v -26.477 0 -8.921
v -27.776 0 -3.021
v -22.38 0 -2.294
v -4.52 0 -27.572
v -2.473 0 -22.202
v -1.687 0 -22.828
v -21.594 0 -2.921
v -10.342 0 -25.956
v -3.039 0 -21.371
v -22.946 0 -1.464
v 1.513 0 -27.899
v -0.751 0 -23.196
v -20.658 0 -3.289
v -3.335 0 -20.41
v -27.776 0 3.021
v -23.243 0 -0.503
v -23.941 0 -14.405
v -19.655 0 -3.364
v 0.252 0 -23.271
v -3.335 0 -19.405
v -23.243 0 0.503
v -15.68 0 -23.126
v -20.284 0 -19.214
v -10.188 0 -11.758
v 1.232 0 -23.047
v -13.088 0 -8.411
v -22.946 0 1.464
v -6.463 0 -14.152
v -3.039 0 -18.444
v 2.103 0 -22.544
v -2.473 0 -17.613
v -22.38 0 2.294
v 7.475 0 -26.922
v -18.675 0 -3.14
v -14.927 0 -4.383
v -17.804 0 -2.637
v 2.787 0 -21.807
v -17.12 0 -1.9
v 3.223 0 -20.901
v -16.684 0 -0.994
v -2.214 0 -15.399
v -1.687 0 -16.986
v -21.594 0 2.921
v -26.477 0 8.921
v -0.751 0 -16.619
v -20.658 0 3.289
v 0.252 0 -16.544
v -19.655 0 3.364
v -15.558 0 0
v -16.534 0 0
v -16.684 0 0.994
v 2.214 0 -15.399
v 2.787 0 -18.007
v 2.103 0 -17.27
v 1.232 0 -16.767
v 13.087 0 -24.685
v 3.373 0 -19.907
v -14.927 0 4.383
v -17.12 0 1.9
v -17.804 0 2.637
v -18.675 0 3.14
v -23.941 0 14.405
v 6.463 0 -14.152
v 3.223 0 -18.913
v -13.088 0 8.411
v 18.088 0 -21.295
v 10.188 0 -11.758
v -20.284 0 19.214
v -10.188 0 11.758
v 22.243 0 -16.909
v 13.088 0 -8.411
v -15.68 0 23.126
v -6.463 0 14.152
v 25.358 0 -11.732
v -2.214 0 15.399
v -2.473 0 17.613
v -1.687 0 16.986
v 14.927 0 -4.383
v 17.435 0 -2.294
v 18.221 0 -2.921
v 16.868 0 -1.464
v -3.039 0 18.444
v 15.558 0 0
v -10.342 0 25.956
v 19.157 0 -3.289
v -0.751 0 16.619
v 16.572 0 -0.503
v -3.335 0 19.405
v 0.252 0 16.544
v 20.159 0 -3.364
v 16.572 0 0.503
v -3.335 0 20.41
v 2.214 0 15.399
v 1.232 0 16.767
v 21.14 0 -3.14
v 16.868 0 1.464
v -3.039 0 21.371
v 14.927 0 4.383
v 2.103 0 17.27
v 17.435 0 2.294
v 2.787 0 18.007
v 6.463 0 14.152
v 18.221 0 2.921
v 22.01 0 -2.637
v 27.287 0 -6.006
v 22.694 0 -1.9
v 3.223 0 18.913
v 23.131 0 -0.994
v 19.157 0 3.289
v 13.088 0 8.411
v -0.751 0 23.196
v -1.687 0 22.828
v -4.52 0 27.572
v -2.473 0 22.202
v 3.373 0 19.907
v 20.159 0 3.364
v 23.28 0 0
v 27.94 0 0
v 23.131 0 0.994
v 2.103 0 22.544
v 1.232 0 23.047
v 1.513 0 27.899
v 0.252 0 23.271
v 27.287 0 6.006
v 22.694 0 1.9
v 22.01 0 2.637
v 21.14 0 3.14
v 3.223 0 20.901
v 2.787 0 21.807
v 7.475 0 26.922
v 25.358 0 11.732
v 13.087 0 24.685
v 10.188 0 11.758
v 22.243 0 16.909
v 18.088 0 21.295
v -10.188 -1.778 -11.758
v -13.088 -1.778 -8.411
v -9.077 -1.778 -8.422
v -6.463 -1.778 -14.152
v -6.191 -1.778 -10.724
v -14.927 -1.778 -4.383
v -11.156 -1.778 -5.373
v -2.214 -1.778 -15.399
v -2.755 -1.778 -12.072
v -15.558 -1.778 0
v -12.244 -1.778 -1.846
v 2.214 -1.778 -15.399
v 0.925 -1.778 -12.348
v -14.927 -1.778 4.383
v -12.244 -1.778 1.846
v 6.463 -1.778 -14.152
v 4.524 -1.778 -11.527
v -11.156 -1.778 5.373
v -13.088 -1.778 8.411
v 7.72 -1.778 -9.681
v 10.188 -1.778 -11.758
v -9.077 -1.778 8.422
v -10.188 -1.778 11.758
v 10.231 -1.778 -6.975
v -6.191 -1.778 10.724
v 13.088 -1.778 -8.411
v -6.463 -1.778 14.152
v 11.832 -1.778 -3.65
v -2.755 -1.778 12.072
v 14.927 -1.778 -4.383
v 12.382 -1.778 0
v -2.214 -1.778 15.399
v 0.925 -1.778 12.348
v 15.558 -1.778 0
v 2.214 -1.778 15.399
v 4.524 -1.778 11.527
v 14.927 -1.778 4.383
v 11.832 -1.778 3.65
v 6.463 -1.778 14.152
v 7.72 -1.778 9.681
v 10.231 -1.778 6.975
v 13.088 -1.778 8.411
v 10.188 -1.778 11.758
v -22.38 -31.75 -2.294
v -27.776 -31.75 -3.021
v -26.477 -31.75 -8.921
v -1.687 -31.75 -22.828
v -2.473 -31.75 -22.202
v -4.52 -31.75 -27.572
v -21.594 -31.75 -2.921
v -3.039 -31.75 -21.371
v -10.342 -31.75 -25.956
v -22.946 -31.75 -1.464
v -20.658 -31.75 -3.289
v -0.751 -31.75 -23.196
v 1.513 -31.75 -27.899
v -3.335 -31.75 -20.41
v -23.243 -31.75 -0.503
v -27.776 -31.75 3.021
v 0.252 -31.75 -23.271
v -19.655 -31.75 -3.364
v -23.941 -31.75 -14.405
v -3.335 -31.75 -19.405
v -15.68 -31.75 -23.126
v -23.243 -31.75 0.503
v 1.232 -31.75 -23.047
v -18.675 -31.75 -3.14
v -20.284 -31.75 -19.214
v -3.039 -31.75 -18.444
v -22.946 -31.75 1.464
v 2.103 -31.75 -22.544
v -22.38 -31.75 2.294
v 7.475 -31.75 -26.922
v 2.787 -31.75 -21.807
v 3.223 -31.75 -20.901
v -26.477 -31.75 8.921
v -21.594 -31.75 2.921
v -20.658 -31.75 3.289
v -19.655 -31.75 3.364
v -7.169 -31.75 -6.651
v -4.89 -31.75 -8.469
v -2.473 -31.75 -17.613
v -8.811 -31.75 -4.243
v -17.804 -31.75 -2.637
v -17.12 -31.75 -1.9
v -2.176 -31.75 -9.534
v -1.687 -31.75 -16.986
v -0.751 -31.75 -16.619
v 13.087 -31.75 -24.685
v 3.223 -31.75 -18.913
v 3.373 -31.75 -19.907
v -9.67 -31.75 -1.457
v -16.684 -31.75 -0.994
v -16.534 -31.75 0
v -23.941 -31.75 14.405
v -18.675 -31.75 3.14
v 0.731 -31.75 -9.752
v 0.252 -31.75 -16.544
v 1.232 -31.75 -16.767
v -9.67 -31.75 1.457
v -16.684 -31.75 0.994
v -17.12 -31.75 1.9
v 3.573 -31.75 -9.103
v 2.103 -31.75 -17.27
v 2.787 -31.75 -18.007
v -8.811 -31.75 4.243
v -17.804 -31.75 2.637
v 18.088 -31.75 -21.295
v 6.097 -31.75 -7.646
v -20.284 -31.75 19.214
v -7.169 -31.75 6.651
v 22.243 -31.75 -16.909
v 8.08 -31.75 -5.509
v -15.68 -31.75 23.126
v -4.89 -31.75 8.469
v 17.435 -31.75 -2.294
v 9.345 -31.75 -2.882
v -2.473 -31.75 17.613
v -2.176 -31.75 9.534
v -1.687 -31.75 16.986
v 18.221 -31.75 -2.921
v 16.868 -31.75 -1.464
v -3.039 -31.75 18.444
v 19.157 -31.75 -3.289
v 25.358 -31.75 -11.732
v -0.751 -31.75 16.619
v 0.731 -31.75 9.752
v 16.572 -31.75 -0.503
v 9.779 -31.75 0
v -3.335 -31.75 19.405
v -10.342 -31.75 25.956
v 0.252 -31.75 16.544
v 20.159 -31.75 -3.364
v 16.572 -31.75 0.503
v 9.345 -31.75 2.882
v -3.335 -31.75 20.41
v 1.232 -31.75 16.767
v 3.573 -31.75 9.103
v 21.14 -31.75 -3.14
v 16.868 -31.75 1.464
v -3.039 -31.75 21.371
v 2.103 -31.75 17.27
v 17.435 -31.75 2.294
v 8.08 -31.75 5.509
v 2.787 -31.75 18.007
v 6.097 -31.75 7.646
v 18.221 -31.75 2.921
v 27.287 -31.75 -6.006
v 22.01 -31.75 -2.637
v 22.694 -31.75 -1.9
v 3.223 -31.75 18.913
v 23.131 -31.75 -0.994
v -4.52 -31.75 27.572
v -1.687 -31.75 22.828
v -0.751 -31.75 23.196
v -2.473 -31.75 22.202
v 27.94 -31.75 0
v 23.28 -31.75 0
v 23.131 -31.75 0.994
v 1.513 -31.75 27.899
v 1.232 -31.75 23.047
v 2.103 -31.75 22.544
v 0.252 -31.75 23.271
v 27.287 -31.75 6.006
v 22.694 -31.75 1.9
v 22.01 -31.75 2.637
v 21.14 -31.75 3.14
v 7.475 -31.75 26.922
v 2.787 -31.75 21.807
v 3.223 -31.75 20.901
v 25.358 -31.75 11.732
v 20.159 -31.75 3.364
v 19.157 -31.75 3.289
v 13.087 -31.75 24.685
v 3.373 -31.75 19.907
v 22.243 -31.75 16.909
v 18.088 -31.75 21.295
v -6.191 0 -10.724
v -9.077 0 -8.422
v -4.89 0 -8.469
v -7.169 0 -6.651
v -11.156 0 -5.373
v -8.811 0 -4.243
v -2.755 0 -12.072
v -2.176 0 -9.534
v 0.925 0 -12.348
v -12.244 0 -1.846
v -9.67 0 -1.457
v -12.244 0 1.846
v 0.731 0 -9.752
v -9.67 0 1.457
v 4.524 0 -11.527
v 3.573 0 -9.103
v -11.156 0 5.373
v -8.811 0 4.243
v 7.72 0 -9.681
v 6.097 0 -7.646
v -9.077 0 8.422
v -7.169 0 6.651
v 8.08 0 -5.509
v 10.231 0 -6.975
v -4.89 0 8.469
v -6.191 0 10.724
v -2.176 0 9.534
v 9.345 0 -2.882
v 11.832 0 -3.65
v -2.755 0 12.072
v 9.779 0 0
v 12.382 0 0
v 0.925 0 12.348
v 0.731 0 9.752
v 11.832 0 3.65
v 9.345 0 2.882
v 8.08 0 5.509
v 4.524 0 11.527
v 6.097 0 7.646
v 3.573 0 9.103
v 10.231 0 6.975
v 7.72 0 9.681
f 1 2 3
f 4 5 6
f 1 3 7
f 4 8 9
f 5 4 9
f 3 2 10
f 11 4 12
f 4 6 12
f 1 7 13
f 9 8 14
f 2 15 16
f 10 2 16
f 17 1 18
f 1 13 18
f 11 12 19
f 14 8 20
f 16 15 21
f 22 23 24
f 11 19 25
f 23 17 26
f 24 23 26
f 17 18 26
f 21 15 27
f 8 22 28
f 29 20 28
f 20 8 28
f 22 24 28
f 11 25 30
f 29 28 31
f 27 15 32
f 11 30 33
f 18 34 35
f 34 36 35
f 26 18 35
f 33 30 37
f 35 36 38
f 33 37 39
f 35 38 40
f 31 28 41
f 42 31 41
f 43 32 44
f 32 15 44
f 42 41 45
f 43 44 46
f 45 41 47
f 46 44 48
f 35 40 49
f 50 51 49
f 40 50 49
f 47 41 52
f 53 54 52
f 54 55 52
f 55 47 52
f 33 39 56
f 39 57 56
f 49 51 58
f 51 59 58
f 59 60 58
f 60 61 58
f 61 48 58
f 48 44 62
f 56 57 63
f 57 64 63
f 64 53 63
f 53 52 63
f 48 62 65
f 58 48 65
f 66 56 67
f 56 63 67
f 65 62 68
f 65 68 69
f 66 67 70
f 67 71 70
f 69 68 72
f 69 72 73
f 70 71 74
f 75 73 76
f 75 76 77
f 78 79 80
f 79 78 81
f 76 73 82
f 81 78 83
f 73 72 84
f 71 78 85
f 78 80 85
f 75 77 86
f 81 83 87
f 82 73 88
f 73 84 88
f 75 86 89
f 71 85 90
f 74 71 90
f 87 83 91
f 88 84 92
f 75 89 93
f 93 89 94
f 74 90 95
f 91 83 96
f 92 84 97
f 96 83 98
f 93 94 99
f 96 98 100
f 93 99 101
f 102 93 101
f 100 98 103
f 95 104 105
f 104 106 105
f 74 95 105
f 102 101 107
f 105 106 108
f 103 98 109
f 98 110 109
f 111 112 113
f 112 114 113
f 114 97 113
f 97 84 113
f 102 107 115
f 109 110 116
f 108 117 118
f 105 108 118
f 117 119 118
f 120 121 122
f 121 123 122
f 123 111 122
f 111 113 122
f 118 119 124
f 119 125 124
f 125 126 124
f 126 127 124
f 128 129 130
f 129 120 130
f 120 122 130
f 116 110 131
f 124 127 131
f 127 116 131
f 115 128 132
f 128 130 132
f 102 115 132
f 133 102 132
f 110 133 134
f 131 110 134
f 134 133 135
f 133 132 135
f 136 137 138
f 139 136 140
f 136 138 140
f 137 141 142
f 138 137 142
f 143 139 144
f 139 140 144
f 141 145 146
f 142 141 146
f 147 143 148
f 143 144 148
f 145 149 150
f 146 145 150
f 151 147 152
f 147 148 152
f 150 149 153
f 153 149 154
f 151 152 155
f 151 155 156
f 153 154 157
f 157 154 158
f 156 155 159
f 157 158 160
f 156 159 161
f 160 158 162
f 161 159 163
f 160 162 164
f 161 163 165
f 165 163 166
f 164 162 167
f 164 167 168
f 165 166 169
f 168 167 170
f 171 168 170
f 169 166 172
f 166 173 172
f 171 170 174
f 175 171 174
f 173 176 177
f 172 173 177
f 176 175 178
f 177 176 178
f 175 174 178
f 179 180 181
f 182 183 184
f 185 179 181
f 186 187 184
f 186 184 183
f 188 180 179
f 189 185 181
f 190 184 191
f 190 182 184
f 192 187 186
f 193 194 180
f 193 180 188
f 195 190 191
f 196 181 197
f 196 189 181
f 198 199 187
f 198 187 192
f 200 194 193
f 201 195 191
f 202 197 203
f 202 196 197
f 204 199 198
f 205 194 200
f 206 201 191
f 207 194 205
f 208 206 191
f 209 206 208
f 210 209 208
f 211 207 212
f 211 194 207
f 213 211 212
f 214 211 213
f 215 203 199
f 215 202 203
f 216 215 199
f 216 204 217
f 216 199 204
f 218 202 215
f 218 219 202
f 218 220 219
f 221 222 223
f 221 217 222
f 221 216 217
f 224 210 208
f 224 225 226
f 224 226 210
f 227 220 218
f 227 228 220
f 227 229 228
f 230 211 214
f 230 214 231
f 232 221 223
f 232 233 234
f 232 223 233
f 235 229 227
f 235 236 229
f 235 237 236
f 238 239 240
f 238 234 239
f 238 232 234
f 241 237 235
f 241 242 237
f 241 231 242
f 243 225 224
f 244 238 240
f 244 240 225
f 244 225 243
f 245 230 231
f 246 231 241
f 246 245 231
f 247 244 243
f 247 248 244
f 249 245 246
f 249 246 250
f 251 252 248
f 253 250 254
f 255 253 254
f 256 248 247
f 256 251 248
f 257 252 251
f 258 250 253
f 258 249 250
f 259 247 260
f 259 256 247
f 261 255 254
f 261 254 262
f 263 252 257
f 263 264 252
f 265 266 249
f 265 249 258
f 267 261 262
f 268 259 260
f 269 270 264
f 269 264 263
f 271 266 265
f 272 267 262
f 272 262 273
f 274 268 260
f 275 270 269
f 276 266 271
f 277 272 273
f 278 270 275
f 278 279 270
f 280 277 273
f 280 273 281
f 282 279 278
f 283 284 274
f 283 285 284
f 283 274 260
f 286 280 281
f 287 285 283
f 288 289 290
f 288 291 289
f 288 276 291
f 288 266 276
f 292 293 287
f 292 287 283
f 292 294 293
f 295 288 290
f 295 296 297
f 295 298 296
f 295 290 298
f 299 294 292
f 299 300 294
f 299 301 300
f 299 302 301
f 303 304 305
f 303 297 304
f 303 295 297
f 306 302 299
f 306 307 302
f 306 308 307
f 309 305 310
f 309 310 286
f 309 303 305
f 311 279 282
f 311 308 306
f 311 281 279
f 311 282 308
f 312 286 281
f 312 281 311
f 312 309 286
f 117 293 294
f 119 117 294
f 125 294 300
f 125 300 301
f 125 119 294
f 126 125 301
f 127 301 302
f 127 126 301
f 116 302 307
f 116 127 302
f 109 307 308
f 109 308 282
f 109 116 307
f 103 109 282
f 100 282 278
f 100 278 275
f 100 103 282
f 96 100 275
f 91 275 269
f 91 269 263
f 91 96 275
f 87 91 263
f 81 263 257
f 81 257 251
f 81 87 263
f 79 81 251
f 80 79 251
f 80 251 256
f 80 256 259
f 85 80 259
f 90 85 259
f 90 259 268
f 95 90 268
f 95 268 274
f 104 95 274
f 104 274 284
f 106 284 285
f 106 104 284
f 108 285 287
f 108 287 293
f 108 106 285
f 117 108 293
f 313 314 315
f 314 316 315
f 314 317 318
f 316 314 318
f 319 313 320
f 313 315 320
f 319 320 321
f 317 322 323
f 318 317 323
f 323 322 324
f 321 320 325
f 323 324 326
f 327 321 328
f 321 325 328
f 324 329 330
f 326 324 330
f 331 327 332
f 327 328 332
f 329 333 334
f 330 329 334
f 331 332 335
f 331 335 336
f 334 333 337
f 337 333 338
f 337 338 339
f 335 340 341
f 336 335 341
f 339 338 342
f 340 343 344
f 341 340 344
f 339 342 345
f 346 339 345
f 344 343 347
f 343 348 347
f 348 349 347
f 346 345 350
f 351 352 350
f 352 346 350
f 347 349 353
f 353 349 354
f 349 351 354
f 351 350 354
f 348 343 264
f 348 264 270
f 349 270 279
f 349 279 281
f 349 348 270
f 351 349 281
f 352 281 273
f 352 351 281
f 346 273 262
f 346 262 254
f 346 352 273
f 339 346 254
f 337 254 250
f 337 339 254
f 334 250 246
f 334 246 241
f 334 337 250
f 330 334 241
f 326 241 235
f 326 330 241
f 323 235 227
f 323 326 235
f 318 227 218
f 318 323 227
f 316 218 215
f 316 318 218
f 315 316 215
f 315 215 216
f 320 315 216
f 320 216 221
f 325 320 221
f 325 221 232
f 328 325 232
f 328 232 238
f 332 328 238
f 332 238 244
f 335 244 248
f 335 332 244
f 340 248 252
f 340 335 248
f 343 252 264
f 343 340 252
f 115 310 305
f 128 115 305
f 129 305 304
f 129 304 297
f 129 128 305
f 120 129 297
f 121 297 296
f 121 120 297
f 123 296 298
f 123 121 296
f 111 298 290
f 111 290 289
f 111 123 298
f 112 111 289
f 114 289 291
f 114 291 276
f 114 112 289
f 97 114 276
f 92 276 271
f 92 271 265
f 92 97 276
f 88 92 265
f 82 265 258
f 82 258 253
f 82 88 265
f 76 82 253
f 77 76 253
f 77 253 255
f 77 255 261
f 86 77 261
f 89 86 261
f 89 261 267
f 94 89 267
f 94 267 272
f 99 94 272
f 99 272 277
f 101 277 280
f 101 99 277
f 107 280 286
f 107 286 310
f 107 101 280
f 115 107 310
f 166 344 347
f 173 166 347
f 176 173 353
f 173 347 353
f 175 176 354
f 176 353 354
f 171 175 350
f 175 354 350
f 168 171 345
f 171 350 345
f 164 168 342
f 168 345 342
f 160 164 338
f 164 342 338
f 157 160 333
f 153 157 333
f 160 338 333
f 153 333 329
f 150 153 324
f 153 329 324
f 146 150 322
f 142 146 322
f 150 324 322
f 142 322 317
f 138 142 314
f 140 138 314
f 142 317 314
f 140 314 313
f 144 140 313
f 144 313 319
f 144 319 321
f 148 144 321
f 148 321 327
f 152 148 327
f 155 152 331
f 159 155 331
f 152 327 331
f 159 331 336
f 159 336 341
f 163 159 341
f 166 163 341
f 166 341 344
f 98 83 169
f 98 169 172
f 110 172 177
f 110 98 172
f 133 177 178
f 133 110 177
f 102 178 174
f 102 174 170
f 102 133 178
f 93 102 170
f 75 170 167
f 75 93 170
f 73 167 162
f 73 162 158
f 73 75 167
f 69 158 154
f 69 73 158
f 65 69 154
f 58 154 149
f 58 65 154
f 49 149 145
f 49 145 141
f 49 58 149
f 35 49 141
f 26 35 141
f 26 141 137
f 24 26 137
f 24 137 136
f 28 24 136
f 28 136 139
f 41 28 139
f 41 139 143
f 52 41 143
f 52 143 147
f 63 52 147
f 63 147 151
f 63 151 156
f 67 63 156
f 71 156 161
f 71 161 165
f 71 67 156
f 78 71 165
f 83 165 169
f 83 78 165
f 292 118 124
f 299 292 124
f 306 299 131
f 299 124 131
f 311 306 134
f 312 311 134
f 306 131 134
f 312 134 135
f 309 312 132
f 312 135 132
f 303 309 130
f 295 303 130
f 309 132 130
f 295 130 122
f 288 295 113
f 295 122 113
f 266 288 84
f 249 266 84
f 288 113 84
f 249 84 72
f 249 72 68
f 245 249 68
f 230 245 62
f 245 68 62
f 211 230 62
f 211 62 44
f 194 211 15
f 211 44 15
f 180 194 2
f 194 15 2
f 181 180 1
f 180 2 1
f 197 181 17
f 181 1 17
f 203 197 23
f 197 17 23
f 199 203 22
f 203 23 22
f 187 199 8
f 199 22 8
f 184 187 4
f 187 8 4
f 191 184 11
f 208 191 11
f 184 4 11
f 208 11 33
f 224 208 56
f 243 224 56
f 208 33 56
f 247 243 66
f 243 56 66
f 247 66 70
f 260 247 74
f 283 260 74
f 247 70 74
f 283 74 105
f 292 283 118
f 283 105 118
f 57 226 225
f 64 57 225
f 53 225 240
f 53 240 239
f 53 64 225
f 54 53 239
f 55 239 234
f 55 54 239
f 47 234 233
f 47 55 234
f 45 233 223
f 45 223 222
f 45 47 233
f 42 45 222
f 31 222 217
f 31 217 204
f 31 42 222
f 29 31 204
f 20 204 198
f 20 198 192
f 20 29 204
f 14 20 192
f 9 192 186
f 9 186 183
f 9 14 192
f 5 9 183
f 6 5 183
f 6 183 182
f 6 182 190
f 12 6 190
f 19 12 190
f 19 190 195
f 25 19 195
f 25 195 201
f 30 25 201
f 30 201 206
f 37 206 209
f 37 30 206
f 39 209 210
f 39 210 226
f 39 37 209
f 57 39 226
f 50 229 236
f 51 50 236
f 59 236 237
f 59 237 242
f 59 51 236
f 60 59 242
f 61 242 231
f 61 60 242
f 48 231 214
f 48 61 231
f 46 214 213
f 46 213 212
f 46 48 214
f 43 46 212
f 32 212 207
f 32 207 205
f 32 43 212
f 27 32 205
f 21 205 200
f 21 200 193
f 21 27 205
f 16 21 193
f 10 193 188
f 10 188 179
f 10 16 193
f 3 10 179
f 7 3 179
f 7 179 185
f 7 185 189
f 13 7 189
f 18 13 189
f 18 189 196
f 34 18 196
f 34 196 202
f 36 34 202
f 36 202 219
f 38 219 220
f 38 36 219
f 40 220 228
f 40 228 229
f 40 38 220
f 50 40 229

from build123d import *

# Parameters (mm, degrees)
F0_R     = 27.94
F0_R_2   = 3.37312
F0_R_3   = 9.779
F1_DEPTH = 31.75
F2_R     = 15.5575
F2_R_2   = 12.3825
F3_DEPTH = 1.778


with BuildPart() as f1:
    # F0 (on Front) → F1 (new body)
    with BuildSketch(Plane.XZ):
        Circle(F0_R)
        with Locations((0, -19.90725)):
            Circle(F0_R_2, mode=Mode.SUBTRACT)
        with Locations((-19.90725, 0)):
            Circle(F0_R_2, mode=Mode.SUBTRACT)
        Circle(F0_R_3, mode=Mode.SUBTRACT)
        with Locations((19.90725, 0)):
            Circle(F0_R_2, mode=Mode.SUBTRACT)
        with Locations((0, 19.90725)):
            Circle(F0_R_2, mode=Mode.SUBTRACT)
    extrude(amount=F1_DEPTH)

    # F2 (on Front) → F3 (cut)
    with BuildSketch(Plane.XZ):
        Circle(F2_R)
        Circle(F2_R_2, mode=Mode.SUBTRACT)
    extrude(amount=F3_DEPTH, mode=Mode.SUBTRACT)


solid = f1.part
